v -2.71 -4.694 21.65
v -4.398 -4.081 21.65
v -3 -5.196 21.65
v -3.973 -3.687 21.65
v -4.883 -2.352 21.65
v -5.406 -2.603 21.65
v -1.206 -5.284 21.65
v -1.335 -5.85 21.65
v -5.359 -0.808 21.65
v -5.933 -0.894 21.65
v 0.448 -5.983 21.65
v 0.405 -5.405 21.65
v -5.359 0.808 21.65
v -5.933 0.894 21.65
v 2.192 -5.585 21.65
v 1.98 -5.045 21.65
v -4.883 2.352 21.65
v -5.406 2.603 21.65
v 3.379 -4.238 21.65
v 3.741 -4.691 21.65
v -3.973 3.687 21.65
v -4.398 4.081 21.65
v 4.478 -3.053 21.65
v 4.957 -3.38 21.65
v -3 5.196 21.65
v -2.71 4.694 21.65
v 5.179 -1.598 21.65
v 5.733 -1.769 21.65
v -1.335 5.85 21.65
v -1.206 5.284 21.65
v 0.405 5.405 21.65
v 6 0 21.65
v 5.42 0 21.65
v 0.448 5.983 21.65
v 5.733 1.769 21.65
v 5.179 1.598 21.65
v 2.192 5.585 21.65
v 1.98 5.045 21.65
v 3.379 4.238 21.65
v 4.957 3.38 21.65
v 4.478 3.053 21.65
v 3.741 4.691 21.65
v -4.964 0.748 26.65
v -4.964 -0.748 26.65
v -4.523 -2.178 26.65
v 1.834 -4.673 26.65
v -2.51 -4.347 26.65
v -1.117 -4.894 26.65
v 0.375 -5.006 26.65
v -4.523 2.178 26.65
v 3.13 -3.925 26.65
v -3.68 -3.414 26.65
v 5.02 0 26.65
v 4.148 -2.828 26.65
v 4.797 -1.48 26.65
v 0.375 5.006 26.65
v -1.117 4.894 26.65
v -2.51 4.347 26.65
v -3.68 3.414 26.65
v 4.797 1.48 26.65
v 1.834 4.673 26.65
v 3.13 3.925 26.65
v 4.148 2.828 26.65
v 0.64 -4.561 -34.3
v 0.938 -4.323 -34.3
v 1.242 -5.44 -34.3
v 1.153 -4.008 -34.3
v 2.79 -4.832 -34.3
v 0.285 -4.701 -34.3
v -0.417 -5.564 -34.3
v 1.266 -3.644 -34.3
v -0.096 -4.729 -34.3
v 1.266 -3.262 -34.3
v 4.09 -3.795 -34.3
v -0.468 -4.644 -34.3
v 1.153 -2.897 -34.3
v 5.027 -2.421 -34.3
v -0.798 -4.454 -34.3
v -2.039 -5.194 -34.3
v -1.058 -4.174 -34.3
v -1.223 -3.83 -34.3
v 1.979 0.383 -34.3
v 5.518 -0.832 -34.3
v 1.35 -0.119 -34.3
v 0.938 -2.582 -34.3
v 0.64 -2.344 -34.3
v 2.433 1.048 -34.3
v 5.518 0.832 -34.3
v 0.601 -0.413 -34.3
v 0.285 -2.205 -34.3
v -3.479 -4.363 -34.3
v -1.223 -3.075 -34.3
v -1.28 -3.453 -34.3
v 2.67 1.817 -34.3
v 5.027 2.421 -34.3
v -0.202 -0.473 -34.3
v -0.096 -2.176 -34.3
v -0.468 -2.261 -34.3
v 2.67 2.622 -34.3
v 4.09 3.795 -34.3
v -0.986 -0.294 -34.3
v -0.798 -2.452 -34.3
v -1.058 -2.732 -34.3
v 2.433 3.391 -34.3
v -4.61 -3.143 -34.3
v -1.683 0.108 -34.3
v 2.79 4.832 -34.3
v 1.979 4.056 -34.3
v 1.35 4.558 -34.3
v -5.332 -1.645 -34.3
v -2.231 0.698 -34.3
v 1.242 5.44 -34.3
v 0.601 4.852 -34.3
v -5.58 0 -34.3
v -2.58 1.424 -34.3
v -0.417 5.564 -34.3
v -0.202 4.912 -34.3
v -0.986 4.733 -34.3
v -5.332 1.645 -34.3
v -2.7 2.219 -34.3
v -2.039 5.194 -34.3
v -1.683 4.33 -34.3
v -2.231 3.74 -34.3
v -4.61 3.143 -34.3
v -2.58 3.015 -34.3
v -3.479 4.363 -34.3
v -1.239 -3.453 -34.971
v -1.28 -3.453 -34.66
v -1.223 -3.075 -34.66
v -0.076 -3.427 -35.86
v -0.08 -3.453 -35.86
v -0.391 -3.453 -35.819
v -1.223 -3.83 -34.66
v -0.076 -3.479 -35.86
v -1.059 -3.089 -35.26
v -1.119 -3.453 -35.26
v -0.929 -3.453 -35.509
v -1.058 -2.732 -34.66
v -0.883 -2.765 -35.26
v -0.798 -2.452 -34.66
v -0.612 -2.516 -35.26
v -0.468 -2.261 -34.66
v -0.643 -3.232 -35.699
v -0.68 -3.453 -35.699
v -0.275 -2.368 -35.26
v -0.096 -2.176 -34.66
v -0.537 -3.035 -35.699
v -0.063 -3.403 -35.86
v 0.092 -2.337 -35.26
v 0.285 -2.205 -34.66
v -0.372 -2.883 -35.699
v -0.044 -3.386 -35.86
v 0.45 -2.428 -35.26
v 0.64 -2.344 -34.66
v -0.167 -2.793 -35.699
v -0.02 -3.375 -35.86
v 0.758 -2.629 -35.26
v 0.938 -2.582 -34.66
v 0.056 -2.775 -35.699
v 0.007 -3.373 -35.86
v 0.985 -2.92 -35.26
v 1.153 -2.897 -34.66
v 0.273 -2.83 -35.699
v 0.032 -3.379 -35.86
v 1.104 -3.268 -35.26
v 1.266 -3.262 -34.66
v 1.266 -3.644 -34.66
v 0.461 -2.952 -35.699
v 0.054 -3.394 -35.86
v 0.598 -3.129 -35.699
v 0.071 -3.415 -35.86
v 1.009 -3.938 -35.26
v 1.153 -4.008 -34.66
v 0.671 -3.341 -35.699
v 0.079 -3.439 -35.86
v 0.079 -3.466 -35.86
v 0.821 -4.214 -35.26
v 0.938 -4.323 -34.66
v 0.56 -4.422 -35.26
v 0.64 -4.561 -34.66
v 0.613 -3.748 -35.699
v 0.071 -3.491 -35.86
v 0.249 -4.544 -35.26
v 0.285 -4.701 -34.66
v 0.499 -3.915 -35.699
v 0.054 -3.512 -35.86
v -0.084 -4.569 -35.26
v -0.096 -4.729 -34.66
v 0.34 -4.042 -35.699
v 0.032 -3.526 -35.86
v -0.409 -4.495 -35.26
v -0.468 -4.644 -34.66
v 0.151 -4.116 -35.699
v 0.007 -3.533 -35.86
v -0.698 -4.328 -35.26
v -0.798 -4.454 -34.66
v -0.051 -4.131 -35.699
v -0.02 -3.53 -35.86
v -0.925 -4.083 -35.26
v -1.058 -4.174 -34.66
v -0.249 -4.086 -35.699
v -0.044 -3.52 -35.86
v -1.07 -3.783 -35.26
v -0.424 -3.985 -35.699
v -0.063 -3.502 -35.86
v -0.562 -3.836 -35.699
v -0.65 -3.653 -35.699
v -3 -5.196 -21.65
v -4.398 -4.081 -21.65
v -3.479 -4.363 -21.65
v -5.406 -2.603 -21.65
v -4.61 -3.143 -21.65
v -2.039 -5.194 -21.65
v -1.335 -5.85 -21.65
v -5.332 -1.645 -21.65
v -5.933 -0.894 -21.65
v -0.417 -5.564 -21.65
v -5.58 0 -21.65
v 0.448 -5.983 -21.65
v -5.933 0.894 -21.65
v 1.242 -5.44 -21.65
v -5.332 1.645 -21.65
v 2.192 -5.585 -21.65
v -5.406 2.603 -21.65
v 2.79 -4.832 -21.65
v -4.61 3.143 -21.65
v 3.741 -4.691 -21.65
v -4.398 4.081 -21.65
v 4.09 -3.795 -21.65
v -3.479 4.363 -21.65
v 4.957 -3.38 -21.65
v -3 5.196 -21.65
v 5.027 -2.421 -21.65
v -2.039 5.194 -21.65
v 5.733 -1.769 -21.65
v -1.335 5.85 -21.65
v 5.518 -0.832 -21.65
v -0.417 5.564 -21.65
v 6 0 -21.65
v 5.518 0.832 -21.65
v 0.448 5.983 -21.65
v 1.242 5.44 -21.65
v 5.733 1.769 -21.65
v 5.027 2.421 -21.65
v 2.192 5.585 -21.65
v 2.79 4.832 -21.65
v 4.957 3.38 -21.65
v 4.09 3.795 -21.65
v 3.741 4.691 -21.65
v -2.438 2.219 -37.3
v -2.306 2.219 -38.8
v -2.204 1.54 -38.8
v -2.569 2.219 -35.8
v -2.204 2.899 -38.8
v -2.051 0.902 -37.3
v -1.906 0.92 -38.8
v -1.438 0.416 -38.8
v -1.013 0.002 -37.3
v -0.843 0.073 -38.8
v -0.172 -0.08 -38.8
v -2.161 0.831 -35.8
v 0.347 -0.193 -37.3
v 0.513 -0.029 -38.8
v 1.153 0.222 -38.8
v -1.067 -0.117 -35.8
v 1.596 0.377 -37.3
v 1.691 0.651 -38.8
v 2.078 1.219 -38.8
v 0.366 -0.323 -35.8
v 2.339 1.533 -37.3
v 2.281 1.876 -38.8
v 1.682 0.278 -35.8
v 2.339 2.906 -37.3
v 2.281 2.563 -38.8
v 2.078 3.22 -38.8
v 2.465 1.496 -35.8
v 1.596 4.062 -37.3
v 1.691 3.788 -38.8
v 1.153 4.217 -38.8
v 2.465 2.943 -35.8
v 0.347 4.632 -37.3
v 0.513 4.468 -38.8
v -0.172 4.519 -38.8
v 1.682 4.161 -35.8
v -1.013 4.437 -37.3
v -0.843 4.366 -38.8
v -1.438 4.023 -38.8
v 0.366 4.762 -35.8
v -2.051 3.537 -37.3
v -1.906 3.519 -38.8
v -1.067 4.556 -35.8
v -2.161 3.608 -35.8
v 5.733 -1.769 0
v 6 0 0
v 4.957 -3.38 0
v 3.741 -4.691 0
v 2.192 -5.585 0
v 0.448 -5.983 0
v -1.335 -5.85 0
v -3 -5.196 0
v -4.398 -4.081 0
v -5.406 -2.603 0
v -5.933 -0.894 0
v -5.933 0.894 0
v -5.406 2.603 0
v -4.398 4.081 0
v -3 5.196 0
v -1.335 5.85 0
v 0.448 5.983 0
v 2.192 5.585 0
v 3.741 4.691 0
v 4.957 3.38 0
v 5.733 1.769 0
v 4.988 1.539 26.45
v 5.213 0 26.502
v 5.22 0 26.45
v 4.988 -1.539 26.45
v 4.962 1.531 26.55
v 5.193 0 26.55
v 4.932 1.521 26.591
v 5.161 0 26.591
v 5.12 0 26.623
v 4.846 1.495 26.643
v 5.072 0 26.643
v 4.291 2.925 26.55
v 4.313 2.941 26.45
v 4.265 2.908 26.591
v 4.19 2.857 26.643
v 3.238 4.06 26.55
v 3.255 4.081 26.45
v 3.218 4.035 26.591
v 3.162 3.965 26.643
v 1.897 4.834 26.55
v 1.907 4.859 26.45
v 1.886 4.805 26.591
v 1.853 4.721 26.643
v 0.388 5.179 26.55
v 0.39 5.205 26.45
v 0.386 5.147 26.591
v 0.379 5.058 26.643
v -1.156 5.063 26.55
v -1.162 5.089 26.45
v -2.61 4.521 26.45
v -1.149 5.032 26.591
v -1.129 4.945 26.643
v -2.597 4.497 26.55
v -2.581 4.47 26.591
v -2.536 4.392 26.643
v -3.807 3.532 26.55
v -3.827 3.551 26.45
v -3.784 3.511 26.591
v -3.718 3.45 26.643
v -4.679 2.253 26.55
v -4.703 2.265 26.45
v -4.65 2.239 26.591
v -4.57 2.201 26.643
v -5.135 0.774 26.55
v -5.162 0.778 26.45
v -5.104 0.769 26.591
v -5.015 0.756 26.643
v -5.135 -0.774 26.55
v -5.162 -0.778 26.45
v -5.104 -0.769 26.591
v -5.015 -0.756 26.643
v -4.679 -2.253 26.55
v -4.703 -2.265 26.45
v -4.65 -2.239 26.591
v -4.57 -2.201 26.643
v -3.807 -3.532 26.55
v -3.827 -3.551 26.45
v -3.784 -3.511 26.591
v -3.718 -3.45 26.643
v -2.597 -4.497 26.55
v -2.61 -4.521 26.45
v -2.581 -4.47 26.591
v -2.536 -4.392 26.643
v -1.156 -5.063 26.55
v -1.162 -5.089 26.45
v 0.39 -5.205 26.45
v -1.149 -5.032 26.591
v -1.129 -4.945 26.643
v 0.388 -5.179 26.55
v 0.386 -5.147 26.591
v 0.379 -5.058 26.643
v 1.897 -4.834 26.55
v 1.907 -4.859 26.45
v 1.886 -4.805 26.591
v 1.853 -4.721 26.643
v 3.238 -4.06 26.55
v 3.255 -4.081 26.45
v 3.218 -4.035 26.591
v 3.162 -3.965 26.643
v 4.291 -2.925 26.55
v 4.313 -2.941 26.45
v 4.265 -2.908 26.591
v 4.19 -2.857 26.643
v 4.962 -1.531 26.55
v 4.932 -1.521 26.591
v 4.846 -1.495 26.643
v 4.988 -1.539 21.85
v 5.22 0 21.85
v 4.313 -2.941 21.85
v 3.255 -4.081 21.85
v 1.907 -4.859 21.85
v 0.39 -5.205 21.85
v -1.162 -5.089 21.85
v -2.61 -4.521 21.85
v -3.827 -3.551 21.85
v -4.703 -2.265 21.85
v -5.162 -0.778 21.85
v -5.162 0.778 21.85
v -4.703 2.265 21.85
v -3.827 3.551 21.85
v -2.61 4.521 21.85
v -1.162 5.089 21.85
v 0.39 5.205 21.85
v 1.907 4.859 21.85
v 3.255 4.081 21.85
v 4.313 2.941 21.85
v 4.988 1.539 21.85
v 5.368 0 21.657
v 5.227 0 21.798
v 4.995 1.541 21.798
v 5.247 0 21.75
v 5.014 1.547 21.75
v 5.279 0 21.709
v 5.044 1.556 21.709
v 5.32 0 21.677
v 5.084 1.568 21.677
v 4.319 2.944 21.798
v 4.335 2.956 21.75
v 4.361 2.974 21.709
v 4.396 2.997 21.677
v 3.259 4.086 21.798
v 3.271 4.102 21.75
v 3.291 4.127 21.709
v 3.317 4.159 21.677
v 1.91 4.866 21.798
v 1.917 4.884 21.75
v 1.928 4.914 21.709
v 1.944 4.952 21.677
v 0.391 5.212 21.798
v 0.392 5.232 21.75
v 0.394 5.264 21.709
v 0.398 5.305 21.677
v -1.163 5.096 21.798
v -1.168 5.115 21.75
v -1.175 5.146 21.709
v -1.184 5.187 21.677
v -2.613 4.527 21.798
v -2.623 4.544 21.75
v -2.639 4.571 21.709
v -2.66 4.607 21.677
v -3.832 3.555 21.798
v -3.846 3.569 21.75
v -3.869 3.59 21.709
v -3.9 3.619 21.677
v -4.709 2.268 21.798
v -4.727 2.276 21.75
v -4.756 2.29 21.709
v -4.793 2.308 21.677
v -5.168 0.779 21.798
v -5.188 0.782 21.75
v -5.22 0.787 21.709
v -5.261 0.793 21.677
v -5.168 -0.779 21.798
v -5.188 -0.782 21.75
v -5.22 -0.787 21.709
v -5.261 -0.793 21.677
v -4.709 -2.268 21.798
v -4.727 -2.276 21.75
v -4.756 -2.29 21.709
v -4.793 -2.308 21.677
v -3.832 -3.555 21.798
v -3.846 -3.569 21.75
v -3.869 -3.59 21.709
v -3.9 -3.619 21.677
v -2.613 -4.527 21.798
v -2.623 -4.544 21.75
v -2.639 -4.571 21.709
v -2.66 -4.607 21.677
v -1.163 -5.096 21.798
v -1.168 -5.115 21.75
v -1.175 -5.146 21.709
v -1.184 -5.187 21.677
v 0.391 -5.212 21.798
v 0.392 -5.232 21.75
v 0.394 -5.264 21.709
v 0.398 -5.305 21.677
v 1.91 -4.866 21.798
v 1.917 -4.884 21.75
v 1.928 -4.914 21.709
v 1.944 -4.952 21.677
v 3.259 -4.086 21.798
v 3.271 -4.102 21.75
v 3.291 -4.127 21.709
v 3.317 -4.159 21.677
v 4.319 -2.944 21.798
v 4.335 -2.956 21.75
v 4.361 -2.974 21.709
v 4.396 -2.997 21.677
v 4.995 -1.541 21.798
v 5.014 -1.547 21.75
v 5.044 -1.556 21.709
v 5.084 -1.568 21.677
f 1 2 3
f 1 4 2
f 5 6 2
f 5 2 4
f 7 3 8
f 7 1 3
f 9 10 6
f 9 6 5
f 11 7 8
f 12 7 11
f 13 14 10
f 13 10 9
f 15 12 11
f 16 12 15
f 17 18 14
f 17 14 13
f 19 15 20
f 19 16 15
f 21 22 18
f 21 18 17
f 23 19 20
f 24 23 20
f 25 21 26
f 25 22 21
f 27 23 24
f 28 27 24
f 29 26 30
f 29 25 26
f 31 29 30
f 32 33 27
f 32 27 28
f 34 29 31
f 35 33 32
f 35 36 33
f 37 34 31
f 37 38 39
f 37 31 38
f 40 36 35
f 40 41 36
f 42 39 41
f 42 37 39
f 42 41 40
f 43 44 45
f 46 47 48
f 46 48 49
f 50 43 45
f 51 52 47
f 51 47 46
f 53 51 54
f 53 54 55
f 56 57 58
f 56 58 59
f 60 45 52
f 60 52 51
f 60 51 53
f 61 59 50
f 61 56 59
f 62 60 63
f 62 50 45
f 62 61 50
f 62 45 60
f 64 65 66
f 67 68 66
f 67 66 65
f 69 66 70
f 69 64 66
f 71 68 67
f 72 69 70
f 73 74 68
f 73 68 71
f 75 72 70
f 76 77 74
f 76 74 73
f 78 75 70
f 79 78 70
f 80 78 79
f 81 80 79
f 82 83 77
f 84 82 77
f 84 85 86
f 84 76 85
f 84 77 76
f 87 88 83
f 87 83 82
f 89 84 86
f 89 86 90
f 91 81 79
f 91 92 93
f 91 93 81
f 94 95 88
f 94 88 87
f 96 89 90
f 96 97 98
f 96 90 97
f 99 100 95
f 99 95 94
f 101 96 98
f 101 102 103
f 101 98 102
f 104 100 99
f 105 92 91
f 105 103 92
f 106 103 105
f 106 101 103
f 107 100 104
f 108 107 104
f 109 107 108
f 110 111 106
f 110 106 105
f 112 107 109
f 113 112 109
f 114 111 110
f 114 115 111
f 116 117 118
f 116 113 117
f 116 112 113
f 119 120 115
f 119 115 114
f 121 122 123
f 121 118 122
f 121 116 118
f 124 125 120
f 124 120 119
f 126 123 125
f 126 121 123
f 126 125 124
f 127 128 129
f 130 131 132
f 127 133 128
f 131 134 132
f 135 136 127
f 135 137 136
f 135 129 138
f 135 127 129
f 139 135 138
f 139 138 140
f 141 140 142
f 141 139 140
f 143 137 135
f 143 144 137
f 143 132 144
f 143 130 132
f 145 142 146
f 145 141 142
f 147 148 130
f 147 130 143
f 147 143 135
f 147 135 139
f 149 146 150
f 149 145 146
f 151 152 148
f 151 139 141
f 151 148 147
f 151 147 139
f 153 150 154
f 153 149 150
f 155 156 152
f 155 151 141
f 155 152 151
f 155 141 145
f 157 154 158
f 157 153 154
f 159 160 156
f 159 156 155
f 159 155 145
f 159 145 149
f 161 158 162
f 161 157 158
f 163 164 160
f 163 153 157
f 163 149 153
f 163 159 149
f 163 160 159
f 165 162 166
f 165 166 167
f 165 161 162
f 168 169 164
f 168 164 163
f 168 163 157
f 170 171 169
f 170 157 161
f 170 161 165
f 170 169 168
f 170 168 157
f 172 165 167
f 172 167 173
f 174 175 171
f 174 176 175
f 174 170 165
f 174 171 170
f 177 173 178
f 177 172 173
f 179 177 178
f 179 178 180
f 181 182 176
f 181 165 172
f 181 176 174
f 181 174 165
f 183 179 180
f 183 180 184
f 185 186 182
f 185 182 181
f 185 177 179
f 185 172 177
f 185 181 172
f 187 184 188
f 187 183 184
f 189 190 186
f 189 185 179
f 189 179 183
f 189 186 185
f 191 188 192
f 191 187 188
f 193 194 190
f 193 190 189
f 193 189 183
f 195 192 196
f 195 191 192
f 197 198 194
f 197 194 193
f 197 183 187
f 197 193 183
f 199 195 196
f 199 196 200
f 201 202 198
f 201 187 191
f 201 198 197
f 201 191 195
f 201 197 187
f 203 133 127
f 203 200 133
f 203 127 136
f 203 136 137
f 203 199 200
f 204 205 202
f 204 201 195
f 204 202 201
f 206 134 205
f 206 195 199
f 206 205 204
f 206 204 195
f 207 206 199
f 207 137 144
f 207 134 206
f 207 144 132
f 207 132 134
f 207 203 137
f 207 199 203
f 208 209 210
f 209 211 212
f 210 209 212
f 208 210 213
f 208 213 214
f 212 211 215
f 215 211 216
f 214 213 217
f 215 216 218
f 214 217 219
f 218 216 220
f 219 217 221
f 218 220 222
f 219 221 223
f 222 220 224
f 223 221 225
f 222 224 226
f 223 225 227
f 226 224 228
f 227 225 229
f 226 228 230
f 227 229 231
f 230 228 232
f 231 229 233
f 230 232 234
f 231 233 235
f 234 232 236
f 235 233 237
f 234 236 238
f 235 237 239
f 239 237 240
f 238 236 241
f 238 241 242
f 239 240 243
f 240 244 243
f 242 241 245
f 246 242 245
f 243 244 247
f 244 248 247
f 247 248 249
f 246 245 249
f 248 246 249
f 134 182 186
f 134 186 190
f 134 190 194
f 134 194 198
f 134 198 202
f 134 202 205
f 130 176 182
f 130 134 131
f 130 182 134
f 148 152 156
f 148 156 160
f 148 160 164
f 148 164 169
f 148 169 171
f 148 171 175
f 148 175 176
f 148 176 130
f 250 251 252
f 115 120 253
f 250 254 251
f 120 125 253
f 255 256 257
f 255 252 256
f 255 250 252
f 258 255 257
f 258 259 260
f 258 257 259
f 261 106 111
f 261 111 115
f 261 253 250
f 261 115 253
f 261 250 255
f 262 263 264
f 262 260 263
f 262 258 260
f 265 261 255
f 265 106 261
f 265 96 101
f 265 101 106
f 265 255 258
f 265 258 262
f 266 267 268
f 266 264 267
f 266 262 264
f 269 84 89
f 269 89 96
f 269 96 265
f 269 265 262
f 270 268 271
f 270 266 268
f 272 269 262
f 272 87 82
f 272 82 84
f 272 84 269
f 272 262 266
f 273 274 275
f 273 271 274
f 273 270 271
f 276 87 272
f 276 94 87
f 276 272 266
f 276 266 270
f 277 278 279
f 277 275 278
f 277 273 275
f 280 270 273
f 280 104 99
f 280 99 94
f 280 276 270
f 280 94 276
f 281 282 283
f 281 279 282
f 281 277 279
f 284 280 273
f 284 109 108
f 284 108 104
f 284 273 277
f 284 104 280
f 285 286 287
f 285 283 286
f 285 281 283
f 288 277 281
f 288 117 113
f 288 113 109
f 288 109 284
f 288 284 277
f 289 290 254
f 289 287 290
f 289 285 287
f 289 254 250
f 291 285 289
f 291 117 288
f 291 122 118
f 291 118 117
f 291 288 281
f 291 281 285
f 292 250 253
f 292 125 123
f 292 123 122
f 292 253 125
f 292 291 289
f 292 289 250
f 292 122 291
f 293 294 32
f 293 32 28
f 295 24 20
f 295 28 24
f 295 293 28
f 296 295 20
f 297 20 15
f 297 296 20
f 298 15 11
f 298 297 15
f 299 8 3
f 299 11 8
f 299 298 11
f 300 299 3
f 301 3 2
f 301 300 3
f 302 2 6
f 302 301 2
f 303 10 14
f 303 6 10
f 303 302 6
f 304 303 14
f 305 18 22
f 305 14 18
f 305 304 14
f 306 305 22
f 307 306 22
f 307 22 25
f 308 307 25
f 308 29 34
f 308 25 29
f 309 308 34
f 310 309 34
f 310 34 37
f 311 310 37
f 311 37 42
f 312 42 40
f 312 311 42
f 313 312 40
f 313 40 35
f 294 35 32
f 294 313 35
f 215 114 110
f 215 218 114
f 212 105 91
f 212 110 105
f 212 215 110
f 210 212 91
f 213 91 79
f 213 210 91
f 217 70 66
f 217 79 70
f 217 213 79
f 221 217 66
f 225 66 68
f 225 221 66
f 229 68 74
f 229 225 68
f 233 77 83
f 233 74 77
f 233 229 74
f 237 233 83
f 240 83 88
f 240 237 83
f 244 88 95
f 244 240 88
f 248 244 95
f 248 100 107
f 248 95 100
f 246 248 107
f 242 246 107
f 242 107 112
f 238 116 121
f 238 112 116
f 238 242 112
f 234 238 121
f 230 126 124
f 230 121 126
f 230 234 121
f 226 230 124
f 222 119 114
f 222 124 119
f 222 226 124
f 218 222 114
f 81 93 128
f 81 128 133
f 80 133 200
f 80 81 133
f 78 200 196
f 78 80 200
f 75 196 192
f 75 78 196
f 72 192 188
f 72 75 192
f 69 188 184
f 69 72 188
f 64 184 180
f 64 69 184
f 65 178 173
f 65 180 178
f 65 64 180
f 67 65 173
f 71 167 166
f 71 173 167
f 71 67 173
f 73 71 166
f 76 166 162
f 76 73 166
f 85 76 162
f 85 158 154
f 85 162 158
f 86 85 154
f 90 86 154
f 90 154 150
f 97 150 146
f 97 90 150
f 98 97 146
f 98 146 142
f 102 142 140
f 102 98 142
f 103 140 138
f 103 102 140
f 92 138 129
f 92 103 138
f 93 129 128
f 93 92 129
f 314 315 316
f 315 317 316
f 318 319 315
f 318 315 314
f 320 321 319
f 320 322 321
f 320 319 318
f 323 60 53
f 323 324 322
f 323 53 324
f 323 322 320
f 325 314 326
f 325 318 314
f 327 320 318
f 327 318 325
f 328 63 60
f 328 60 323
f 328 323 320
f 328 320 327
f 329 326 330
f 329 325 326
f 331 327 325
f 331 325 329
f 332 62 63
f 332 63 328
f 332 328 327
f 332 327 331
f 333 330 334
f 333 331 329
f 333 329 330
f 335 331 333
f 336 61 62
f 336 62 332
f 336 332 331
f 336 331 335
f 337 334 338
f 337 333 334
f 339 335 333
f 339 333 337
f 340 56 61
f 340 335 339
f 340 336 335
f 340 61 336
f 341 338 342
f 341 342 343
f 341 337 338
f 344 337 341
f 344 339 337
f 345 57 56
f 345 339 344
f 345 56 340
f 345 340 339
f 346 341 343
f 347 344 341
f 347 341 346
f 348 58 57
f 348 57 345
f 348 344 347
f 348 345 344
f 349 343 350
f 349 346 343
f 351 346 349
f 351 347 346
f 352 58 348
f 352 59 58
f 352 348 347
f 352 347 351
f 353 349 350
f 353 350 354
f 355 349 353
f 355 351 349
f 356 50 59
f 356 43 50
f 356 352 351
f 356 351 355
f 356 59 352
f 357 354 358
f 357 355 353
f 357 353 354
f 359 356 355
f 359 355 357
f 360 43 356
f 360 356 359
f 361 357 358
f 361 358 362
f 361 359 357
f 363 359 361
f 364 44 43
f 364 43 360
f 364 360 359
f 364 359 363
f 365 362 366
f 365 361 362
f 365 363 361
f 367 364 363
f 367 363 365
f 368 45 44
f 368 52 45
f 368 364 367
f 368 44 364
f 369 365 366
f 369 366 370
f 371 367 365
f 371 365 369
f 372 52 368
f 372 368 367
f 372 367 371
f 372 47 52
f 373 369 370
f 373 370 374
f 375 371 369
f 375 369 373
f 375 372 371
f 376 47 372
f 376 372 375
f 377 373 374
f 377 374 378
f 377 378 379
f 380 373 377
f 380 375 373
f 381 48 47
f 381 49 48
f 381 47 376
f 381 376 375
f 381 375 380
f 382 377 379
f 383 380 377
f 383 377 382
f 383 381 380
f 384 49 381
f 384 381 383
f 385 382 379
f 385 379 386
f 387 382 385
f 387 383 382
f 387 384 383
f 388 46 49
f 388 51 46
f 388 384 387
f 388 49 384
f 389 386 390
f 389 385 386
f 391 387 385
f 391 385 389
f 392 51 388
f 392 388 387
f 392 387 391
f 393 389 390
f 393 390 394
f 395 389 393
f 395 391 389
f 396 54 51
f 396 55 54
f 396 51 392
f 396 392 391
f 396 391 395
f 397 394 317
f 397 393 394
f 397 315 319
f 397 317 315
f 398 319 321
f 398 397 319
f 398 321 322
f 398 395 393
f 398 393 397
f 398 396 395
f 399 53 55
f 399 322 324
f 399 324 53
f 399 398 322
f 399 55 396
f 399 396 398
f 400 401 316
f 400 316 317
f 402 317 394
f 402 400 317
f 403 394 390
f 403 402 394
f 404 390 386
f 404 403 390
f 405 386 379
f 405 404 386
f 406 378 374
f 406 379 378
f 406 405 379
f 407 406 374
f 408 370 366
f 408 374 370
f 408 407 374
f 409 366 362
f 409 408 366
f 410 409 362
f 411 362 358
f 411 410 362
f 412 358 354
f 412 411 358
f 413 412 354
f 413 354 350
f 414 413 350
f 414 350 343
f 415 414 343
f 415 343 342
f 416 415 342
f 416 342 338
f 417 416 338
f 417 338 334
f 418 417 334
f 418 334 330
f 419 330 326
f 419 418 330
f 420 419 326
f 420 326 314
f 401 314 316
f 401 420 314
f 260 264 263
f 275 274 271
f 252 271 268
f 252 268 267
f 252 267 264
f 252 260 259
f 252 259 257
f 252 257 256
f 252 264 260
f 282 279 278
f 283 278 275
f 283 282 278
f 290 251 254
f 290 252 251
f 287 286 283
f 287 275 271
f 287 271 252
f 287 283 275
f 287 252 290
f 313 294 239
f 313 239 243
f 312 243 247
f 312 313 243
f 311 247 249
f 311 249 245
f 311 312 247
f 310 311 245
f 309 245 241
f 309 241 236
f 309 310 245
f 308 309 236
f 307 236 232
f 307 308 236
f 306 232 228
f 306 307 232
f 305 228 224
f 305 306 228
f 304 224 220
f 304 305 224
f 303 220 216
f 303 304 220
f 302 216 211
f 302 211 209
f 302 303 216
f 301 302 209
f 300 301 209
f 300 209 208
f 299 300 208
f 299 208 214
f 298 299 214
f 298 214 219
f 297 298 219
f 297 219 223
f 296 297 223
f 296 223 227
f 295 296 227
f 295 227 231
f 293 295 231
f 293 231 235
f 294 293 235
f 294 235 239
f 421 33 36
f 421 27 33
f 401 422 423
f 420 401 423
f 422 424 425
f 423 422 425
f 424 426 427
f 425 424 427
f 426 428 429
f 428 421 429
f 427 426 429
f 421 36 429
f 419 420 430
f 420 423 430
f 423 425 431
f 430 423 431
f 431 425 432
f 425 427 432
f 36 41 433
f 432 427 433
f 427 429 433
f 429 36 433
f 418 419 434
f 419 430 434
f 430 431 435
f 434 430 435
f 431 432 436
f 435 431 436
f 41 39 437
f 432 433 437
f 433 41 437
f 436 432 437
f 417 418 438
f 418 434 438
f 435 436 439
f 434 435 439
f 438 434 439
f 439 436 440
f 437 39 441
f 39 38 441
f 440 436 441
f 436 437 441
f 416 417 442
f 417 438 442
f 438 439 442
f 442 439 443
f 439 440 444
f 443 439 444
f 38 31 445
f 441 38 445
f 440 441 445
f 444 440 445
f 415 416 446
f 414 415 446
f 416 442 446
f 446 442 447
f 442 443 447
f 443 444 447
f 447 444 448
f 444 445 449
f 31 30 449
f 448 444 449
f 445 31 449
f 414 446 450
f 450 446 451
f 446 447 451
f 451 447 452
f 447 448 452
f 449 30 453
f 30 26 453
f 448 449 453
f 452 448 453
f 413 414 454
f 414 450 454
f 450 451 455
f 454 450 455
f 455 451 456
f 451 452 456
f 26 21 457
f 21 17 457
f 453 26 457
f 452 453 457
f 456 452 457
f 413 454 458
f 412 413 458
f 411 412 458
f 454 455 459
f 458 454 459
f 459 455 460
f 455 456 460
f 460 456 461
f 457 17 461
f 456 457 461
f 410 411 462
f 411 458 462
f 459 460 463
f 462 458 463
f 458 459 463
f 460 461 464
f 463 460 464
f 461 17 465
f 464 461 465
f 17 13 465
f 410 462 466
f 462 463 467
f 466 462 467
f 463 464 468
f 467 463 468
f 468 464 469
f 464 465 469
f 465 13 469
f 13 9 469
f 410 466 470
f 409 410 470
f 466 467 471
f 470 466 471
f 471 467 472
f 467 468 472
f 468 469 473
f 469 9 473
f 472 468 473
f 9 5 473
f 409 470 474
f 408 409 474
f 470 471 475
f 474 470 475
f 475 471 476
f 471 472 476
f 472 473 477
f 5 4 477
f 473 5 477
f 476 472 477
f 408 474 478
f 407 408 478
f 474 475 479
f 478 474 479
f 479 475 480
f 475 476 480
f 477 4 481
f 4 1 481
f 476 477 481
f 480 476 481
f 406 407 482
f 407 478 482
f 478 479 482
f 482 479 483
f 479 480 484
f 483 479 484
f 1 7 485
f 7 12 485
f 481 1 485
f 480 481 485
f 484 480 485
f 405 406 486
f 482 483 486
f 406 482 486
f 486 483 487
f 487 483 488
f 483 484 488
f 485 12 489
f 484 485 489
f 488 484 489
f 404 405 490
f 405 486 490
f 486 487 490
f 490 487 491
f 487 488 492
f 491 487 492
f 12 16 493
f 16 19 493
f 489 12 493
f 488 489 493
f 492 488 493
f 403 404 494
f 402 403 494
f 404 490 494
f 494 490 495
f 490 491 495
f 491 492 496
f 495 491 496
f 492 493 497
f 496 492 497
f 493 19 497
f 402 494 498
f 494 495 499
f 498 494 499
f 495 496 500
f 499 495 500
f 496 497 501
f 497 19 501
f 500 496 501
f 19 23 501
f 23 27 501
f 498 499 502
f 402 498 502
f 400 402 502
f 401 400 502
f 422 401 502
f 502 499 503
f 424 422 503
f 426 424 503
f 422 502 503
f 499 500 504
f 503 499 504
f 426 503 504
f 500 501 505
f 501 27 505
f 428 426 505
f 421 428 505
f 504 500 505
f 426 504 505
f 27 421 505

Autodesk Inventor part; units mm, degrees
ref_plane "YZ Plane" through (0, 0, 0) normal (1, 0, 0) x (0, 1, 0)
ref_plane "XZ Plane" through (0, 0, 0) normal (0, 1, 0) x (-1, 0, 0)
ref_plane "XY Plane" through (0, 0, 0) normal (0, 0, 1) x (1, 0, 0)
sketch "Sketch1" plane through (0, 0, 0) normal (0, 0, 1) x (1, 0, 0)
  circle A0 centre (0, 0) radius 6
  dimension "d0" = 12
extrude "Extrusion1" add sketch "Sketch1" along normal mid plane 43.3
thread "Thread1" size "M12x1.75" class "6g" standard "ISO Metric profile" full length
sketch "Sketch2" plane through (0, 0, 21.65) normal (0, 0, 1) x (1, 0, 0)
  circle A0 centre (0, 0) radius 5.22
  dimension "d5" = 10.44
extrude "Extrusion2" add sketch "Sketch2" along normal blind 5
fillet "Fillet1" radius 0.2 1 edges at (-5.22, 0, 26.65)
fillet "Fillet2" radius 0.2 1 edges at (-5.22, 0, 21.65)
sketch "Sketch3" plane through (0, 0, -21.65) normal (0, 0, -1) x (-1, 0, 0)
  circle A0 centre (0, 0) radius 5.58
  dimension "d10" = 11.16
extrude "Extrusion3" add sketch "Sketch3" along normal blind 12.65
sketch "Sketch4" plane through (0, 0, -34.3) normal (0, 0, -1) x (-1, 0, 0)
  circle A0 centre (0, 2.2194) radius 2.7
  point P0 (0, 0)
  dimension "d13" = 5.4
extrude "Extrusion4" add sketch "Sketch4" along normal blind 4.5
draft "FaceDraft1" angle 5 pull direction (0, 0, -1) faces at (-2.6912, 2.0021, -37.3) fixed edges at (2.7, 2.2194, -34.3)
sketch "Sketch5" plane through (0, 0, -34.3) normal (0, 0, -1) x (-1, 0, 0)
  circle A0 centre (0, -3.4527) radius 1.2802
  point P0 (0, 0)
extrude "Extrusion5" add sketch "Sketch5" along normal blind 1.56
fillet "Fillet3" radius 1.2 1 edges at (1.2802, -3.4527, -35.86)
properties part number "LJ12A3-4-z-BY inductive switch"
